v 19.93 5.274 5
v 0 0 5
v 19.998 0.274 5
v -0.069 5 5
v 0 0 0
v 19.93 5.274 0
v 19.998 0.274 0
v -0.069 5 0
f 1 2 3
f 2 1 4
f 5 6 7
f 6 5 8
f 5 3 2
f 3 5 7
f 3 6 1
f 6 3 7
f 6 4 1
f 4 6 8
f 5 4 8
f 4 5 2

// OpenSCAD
// expect: rotate() takes degrees
rotate([0, 0, PI / 4]) cube([20, 5, 5]);
